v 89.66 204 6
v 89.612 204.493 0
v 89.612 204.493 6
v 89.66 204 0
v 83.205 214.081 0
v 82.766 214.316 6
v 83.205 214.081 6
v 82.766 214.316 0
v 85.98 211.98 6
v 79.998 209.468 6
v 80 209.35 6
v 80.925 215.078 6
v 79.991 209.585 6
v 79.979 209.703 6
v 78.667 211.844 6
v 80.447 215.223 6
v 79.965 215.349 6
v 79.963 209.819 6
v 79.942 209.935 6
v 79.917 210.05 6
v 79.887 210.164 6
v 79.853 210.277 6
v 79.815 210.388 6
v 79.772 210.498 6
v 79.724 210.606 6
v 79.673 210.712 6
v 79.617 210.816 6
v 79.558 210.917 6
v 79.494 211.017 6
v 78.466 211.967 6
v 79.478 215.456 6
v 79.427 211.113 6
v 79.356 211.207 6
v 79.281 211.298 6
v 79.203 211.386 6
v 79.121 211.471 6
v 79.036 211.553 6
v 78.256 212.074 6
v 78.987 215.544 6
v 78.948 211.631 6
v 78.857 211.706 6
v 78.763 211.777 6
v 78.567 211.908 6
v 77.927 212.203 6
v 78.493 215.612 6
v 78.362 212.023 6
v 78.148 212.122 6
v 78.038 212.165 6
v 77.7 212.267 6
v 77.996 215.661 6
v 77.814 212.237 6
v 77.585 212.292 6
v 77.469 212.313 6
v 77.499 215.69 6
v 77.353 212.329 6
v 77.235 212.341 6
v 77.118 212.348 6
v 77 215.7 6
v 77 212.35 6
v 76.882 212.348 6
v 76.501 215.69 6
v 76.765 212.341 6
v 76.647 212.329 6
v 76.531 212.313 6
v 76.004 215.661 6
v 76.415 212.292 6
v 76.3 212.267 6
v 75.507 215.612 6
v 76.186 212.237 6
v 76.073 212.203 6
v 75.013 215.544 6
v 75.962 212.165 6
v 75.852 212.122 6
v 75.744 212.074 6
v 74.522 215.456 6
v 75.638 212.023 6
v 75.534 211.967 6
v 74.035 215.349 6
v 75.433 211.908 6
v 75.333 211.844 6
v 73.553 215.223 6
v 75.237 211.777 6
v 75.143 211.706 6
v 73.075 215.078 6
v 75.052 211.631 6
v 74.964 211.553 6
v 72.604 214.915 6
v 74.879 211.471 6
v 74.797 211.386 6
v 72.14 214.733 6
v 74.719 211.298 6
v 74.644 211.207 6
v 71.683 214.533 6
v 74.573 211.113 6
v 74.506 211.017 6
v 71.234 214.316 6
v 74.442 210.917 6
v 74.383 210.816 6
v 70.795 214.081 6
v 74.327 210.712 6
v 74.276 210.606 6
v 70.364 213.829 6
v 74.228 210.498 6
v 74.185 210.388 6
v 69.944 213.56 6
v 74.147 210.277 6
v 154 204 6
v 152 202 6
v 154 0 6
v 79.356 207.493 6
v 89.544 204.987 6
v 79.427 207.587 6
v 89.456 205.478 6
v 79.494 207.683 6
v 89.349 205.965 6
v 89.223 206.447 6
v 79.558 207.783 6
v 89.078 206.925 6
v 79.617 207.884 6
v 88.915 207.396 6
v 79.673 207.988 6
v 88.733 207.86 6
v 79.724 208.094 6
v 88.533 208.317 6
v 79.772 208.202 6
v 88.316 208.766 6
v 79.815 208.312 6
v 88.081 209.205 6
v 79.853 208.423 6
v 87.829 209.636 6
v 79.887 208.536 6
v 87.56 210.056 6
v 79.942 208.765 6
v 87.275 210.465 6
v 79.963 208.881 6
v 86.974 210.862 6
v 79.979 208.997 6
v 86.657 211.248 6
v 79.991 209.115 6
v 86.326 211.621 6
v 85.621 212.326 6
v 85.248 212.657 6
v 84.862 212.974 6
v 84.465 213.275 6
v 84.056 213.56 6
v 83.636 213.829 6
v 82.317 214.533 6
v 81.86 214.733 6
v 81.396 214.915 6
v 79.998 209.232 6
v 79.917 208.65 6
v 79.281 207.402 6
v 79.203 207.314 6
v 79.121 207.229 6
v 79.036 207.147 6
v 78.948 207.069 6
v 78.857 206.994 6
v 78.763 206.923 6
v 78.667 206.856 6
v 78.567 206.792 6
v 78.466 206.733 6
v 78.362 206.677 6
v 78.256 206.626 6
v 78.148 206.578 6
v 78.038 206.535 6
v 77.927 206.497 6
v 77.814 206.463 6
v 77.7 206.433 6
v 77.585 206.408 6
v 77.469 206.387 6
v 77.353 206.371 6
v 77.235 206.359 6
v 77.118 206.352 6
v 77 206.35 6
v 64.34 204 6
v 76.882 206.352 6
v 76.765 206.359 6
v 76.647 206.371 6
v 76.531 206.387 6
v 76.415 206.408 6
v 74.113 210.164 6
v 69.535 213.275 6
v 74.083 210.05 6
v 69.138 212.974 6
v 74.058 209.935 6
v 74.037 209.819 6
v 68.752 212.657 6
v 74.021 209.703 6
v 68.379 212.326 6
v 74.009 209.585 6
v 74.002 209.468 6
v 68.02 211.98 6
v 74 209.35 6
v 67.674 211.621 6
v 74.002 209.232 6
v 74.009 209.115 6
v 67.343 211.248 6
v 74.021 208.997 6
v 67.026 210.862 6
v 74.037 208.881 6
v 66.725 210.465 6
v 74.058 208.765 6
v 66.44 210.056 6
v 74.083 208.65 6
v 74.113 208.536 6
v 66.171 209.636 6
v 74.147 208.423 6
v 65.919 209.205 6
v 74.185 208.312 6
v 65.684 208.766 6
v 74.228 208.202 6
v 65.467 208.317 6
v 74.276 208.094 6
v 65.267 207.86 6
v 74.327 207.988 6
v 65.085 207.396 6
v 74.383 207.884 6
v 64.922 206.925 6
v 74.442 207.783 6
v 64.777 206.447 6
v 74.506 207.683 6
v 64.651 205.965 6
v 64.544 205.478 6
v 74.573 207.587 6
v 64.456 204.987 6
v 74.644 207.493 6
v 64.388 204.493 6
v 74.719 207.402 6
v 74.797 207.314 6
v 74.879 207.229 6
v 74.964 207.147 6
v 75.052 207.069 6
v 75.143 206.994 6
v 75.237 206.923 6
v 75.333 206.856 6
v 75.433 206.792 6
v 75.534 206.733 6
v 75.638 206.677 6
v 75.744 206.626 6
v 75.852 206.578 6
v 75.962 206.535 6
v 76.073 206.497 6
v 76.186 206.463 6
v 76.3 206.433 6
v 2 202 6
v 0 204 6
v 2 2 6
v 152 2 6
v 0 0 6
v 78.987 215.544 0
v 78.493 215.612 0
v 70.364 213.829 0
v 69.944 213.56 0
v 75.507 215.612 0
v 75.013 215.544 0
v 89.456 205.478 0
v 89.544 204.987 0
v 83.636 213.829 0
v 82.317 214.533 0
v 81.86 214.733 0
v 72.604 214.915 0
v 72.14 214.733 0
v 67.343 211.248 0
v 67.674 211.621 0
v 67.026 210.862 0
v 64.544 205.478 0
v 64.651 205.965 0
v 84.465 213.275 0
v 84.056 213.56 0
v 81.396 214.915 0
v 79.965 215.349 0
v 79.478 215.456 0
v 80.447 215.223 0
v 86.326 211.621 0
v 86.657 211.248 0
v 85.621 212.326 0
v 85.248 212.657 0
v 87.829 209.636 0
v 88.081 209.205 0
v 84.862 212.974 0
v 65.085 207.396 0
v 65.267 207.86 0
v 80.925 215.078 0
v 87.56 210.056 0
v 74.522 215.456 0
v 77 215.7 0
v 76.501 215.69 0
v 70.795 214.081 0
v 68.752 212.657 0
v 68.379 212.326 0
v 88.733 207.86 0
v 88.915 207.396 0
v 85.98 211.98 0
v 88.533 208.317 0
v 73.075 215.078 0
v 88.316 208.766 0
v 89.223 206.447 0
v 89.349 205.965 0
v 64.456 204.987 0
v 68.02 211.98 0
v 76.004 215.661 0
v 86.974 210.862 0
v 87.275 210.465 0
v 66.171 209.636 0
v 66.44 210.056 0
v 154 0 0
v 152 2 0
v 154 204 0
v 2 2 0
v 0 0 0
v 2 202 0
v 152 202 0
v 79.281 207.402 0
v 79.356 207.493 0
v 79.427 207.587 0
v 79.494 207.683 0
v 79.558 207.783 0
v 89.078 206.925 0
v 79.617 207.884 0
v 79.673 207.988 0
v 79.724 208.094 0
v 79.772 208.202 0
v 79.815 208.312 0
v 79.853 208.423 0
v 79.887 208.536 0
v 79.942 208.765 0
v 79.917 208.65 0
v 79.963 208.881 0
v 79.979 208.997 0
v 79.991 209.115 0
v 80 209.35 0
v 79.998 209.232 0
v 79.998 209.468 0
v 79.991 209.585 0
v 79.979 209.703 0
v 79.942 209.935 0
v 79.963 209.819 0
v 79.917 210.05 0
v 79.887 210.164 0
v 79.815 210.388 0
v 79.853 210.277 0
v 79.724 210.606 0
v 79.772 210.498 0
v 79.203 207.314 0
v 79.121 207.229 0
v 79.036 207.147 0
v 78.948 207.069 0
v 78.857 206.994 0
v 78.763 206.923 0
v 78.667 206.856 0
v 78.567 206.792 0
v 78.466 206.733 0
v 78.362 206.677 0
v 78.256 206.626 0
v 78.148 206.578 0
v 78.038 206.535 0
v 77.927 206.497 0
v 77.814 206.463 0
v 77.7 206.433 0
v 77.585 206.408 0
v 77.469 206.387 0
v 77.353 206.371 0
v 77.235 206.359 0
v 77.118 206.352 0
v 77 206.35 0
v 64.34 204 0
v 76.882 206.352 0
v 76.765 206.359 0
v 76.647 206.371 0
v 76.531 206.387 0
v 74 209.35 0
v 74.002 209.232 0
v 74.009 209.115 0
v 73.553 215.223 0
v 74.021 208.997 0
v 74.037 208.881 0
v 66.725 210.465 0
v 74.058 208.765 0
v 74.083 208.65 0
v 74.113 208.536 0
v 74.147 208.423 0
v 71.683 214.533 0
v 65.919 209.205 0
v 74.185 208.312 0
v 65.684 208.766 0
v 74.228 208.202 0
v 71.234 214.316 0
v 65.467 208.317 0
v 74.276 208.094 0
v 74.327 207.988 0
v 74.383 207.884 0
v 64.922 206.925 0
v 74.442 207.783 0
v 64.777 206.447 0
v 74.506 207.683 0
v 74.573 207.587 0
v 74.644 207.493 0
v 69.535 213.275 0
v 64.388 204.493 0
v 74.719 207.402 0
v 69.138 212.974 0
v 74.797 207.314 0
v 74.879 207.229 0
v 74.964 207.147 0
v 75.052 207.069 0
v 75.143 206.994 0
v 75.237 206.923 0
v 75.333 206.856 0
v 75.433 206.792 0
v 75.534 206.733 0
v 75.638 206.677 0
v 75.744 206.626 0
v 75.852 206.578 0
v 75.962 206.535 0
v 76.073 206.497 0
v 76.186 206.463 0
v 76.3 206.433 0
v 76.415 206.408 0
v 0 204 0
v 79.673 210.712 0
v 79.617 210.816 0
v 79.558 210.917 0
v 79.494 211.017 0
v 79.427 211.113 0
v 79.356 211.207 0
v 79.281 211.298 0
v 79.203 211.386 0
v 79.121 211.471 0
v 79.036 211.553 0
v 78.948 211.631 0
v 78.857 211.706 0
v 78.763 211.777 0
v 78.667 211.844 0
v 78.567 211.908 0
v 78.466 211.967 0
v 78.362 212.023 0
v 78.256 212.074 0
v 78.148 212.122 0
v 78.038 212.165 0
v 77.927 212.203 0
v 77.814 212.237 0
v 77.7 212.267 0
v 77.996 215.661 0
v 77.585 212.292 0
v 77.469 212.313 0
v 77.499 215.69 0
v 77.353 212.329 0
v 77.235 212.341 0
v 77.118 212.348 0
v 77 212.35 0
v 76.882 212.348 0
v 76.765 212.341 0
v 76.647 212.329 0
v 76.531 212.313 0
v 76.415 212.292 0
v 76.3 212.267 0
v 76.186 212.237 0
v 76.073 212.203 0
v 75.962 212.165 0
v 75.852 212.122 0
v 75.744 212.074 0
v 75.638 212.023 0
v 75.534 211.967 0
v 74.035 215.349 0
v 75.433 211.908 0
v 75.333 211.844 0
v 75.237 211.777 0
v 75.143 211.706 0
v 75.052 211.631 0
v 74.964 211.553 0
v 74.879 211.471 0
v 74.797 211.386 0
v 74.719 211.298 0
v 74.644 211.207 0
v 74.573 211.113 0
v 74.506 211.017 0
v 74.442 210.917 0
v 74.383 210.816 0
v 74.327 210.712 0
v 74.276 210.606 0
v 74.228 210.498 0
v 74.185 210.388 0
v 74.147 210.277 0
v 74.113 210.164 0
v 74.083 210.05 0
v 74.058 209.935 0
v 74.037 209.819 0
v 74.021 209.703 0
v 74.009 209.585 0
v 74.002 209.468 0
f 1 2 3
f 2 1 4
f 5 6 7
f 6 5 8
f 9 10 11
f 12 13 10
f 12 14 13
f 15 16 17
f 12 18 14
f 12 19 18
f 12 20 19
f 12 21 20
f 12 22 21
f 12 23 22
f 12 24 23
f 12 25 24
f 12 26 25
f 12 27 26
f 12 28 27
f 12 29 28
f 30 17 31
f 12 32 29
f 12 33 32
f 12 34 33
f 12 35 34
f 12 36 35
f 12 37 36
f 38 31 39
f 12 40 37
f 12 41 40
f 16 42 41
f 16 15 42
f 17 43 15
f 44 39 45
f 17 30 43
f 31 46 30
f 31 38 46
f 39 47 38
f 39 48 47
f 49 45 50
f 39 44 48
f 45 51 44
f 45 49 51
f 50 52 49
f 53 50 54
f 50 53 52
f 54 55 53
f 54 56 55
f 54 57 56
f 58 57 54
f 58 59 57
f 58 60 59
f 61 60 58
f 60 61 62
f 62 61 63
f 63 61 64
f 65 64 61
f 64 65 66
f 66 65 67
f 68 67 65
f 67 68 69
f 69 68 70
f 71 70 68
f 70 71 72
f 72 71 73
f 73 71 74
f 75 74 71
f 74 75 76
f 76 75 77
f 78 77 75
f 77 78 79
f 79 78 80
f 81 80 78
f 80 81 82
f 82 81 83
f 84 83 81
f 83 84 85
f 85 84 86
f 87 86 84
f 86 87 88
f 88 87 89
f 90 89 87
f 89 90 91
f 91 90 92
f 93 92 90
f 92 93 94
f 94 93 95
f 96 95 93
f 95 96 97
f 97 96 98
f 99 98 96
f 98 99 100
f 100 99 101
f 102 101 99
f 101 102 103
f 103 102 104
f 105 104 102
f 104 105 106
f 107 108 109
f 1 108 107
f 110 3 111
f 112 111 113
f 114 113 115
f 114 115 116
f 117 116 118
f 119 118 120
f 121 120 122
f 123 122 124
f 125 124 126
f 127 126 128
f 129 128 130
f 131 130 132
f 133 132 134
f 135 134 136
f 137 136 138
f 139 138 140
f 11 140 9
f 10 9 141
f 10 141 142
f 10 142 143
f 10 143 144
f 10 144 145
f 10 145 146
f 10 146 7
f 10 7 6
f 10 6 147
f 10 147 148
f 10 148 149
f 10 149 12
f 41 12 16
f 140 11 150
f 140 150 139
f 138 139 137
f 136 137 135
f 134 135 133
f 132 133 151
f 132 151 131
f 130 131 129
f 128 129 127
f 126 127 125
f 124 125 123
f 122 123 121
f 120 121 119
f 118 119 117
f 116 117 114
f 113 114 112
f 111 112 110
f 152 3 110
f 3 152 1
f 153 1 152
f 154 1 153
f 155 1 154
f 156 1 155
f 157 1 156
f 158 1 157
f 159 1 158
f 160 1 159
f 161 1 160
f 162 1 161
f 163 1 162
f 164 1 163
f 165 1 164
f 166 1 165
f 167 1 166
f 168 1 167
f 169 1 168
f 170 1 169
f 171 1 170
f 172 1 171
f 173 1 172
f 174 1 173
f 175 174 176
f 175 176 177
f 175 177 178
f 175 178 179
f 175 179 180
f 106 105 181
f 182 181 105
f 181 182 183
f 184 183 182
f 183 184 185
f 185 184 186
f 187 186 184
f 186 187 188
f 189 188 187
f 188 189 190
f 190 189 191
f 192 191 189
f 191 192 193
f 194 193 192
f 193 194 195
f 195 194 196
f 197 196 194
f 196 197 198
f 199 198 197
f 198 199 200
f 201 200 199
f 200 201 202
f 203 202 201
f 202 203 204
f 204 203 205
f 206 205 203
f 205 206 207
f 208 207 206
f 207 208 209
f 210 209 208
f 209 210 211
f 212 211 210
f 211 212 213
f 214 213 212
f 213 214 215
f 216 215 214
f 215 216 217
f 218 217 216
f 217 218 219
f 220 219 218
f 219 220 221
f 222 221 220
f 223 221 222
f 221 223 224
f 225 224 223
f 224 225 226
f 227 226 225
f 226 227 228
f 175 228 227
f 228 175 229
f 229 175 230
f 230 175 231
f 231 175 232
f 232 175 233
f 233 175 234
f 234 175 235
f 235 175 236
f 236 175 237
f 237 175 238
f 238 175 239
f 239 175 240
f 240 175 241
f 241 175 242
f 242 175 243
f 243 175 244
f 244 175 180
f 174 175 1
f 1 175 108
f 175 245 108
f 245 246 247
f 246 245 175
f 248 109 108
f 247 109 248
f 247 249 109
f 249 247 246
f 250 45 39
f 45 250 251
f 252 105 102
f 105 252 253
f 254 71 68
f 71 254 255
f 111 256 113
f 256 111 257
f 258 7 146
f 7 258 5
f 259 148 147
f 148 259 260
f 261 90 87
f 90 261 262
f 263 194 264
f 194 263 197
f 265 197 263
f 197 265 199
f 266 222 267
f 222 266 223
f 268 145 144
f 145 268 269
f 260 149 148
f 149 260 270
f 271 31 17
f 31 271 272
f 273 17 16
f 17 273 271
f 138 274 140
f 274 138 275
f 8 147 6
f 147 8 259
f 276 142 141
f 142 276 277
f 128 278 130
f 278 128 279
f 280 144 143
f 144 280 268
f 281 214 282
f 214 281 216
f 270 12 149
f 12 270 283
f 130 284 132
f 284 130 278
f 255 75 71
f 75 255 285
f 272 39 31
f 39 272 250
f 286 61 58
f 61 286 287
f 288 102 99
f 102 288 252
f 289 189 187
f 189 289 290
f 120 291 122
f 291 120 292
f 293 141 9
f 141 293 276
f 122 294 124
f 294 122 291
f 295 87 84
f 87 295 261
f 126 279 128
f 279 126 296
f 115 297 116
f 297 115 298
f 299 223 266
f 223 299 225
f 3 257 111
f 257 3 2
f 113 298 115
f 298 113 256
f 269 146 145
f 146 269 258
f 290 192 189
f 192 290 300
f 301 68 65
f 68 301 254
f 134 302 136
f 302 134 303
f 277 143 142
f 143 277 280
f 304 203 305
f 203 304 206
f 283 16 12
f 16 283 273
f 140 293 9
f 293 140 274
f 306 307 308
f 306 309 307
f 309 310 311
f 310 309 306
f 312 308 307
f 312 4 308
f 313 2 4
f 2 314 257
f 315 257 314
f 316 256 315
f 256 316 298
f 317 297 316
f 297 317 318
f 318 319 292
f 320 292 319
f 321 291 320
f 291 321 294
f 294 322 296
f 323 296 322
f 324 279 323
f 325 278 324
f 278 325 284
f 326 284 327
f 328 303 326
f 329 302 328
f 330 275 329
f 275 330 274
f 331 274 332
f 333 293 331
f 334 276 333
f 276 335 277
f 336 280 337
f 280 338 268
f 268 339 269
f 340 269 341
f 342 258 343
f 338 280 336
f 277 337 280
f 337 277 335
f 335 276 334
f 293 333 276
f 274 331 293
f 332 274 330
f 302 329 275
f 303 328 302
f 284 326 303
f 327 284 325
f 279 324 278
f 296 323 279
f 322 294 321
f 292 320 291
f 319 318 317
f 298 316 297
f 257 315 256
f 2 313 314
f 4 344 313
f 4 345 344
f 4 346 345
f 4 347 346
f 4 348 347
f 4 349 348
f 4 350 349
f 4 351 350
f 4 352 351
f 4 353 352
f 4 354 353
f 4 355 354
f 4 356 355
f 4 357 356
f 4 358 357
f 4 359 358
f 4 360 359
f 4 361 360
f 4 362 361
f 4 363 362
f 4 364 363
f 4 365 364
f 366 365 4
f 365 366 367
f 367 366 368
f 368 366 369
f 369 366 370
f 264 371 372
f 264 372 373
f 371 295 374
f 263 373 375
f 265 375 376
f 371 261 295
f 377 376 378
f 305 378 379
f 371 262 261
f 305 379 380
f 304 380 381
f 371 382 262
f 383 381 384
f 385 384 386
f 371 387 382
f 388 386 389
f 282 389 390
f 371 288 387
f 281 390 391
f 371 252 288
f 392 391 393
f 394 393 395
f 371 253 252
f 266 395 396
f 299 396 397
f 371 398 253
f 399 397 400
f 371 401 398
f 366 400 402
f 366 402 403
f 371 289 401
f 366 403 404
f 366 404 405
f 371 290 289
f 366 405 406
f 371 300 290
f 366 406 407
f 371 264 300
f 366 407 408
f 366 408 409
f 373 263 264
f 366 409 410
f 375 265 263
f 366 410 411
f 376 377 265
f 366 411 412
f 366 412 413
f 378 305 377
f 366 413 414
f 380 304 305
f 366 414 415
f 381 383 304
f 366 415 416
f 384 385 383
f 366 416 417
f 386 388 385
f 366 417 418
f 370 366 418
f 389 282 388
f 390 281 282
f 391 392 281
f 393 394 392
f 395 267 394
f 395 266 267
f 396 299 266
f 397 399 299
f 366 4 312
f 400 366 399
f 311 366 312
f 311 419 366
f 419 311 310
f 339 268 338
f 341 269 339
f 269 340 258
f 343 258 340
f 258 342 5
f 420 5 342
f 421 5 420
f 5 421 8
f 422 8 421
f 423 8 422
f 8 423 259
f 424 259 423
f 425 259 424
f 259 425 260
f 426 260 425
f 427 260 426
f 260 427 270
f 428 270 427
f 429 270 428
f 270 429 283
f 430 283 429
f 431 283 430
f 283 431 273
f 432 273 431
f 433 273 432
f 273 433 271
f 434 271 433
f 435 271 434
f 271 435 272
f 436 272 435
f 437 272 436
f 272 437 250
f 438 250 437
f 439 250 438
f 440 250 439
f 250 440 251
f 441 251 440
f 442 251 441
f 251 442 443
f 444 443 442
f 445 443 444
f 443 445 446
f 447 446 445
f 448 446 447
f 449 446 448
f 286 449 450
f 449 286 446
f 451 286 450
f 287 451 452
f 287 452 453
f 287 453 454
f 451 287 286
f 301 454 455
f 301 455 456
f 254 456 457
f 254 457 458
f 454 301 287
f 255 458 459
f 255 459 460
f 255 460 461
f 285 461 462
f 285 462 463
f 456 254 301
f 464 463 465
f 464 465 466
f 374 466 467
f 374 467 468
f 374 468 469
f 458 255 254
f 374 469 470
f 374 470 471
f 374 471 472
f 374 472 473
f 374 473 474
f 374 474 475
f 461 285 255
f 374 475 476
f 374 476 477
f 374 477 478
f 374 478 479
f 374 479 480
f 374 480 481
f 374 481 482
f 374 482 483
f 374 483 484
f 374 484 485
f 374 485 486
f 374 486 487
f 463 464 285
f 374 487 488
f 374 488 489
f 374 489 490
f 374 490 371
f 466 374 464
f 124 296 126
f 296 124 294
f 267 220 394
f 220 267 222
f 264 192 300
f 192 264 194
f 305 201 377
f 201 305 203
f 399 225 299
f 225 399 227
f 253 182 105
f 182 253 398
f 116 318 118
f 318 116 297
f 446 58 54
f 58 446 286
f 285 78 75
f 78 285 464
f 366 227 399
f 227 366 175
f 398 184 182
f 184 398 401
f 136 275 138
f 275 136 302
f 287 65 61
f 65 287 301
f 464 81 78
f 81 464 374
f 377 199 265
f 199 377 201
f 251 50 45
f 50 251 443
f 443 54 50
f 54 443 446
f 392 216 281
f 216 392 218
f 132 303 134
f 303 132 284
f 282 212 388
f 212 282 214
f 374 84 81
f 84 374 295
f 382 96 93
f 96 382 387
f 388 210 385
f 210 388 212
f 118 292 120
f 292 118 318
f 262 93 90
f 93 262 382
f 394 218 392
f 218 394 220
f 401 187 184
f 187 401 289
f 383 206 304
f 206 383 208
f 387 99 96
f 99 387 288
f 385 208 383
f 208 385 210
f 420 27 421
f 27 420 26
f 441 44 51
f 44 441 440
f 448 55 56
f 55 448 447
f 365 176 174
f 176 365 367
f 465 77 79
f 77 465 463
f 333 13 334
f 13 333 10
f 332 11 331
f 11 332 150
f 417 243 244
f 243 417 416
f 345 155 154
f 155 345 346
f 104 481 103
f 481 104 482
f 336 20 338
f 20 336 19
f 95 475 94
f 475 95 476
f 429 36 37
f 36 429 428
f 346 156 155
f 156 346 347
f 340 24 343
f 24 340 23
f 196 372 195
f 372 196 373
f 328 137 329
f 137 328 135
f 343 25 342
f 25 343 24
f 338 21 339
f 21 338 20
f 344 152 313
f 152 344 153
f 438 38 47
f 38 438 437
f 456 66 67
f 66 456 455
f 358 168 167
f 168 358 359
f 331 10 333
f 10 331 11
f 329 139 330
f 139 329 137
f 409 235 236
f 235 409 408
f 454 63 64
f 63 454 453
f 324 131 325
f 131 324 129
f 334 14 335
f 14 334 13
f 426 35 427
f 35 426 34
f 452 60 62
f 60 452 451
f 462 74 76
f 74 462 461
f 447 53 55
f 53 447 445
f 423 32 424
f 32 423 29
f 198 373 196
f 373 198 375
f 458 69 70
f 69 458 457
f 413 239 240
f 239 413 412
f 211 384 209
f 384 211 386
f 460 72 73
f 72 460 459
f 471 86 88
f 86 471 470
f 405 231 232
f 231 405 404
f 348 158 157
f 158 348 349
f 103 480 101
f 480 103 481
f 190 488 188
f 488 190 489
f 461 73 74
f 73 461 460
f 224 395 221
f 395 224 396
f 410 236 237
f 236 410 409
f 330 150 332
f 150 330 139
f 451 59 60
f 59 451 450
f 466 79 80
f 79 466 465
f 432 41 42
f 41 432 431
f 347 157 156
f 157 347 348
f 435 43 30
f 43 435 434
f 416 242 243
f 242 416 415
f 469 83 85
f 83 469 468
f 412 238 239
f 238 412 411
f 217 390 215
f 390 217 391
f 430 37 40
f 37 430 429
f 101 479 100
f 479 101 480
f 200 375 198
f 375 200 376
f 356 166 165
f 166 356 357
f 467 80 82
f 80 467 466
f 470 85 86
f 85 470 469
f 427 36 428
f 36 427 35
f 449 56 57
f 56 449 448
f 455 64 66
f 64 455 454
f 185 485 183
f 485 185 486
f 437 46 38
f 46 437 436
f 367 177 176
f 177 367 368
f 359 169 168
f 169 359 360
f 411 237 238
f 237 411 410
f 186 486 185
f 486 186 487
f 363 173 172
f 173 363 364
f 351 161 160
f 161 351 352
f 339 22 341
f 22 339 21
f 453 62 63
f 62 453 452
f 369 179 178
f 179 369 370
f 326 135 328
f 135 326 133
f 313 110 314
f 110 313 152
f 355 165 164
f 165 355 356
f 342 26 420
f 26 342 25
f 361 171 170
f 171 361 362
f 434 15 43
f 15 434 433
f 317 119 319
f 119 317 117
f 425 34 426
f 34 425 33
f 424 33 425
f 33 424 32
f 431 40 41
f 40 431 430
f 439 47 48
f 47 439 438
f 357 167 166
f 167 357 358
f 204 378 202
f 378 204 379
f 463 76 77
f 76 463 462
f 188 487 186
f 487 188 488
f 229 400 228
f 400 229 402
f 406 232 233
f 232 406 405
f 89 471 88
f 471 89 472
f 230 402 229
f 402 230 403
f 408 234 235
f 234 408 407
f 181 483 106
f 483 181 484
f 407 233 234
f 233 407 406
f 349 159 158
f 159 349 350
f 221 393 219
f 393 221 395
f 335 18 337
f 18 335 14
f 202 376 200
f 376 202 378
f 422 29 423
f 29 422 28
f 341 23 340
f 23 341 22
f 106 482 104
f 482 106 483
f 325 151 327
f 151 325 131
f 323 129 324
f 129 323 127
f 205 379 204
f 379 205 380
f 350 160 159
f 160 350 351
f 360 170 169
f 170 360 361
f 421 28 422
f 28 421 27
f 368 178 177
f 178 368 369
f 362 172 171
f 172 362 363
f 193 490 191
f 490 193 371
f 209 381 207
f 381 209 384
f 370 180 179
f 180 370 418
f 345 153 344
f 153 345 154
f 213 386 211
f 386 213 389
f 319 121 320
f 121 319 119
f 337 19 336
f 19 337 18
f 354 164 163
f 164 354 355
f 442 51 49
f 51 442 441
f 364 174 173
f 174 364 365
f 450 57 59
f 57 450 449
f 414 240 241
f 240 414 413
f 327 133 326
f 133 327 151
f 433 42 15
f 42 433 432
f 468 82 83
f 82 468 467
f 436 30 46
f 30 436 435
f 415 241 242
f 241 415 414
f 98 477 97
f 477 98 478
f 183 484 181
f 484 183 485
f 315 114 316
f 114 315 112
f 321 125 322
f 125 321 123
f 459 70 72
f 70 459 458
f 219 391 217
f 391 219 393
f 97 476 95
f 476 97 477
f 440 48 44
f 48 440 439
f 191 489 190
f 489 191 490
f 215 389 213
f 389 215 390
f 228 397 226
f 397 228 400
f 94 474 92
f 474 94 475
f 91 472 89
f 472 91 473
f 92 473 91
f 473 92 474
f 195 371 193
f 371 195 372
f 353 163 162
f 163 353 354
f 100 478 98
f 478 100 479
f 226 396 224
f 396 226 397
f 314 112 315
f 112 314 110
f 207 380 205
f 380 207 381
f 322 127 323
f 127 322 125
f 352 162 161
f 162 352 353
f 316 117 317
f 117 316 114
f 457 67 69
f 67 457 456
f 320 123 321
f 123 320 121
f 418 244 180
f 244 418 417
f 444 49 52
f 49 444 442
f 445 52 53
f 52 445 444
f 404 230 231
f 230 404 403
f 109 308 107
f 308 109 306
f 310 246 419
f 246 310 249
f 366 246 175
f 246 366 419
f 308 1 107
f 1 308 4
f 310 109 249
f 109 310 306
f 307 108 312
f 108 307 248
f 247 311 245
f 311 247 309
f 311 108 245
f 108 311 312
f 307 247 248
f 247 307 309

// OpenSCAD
inner_x = 150;
inner_y = 200;
inner_z = 6;

wall_thickness = 2;

outer_x = inner_x + (wall_thickness * 2);
outer_y = inner_y + (wall_thickness * 2);
outer_z = inner_z;

loop_r = 12.7;
hole_r = 3;


difference() {
    union() {
        cube([outer_x, outer_y, outer_z]);
        translate([((outer_x / 2)), (inner_y * 1.015), 0]) {
            difference() {
                cylinder(h = inner_z, r = loop_r, $fn = 160);
                translate([0, (loop_r * .5), 0]) {
                    cylinder(h = inner_z, r = hole_r, $fn = 160);
                }
            }
        }        
    }
    
    translate([wall_thickness, wall_thickness, 0]) {
        cube([inner_x, inner_y, inner_z]);
    }
}
